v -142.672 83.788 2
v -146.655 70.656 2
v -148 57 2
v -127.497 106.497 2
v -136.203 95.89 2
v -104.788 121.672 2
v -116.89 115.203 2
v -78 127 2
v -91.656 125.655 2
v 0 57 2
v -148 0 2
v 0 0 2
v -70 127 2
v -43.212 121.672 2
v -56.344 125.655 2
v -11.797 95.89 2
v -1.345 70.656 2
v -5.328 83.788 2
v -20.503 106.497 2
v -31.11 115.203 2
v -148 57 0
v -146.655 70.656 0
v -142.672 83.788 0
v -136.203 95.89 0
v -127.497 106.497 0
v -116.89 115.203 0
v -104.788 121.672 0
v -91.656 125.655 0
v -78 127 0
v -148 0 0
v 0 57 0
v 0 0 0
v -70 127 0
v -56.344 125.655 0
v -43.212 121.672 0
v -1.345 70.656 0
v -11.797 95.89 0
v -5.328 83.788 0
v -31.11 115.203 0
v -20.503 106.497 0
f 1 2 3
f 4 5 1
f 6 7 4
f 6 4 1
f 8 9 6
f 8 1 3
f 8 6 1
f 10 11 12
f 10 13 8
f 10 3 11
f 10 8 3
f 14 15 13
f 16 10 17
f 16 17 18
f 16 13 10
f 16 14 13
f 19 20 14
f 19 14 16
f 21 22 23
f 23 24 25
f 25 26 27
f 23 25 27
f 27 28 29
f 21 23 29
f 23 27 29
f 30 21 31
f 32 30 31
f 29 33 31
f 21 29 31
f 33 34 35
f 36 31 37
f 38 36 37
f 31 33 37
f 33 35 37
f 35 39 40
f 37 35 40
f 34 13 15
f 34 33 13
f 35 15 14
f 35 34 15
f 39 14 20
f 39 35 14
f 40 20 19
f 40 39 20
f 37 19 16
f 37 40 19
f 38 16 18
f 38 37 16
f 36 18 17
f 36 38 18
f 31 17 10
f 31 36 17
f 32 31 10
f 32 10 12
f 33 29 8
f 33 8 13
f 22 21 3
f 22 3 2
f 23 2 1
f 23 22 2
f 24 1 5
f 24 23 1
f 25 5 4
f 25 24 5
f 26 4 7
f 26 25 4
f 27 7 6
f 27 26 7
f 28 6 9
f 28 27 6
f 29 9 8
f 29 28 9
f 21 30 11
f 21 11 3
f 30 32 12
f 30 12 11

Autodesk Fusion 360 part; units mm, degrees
sketch "Sketch1" plane through (0, 0, 0) normal (0, 0, 1) x (1, 0, 0)
  line L0 (0, 0) -> (-148, 0)
  line L1 (-148, 0) -> (-148, 57)
  line L2 (-78, 127) -> (-70, 127)
  line L3 (0, 57) -> (0, 0)
  arc A0 (0, 57) -> (-70, 127) centre (-70, 57) ccw
  arc A1 (-78, 127) -> (-148, 57) centre (-78, 57) ccw
  point P0 (0, 127)
  dimension "d1" = 148
  dimension "d2" = 127
  dimension "d3" = 70
extrude "Extrude1" add sketch "Sketch1" along normal blind 2
